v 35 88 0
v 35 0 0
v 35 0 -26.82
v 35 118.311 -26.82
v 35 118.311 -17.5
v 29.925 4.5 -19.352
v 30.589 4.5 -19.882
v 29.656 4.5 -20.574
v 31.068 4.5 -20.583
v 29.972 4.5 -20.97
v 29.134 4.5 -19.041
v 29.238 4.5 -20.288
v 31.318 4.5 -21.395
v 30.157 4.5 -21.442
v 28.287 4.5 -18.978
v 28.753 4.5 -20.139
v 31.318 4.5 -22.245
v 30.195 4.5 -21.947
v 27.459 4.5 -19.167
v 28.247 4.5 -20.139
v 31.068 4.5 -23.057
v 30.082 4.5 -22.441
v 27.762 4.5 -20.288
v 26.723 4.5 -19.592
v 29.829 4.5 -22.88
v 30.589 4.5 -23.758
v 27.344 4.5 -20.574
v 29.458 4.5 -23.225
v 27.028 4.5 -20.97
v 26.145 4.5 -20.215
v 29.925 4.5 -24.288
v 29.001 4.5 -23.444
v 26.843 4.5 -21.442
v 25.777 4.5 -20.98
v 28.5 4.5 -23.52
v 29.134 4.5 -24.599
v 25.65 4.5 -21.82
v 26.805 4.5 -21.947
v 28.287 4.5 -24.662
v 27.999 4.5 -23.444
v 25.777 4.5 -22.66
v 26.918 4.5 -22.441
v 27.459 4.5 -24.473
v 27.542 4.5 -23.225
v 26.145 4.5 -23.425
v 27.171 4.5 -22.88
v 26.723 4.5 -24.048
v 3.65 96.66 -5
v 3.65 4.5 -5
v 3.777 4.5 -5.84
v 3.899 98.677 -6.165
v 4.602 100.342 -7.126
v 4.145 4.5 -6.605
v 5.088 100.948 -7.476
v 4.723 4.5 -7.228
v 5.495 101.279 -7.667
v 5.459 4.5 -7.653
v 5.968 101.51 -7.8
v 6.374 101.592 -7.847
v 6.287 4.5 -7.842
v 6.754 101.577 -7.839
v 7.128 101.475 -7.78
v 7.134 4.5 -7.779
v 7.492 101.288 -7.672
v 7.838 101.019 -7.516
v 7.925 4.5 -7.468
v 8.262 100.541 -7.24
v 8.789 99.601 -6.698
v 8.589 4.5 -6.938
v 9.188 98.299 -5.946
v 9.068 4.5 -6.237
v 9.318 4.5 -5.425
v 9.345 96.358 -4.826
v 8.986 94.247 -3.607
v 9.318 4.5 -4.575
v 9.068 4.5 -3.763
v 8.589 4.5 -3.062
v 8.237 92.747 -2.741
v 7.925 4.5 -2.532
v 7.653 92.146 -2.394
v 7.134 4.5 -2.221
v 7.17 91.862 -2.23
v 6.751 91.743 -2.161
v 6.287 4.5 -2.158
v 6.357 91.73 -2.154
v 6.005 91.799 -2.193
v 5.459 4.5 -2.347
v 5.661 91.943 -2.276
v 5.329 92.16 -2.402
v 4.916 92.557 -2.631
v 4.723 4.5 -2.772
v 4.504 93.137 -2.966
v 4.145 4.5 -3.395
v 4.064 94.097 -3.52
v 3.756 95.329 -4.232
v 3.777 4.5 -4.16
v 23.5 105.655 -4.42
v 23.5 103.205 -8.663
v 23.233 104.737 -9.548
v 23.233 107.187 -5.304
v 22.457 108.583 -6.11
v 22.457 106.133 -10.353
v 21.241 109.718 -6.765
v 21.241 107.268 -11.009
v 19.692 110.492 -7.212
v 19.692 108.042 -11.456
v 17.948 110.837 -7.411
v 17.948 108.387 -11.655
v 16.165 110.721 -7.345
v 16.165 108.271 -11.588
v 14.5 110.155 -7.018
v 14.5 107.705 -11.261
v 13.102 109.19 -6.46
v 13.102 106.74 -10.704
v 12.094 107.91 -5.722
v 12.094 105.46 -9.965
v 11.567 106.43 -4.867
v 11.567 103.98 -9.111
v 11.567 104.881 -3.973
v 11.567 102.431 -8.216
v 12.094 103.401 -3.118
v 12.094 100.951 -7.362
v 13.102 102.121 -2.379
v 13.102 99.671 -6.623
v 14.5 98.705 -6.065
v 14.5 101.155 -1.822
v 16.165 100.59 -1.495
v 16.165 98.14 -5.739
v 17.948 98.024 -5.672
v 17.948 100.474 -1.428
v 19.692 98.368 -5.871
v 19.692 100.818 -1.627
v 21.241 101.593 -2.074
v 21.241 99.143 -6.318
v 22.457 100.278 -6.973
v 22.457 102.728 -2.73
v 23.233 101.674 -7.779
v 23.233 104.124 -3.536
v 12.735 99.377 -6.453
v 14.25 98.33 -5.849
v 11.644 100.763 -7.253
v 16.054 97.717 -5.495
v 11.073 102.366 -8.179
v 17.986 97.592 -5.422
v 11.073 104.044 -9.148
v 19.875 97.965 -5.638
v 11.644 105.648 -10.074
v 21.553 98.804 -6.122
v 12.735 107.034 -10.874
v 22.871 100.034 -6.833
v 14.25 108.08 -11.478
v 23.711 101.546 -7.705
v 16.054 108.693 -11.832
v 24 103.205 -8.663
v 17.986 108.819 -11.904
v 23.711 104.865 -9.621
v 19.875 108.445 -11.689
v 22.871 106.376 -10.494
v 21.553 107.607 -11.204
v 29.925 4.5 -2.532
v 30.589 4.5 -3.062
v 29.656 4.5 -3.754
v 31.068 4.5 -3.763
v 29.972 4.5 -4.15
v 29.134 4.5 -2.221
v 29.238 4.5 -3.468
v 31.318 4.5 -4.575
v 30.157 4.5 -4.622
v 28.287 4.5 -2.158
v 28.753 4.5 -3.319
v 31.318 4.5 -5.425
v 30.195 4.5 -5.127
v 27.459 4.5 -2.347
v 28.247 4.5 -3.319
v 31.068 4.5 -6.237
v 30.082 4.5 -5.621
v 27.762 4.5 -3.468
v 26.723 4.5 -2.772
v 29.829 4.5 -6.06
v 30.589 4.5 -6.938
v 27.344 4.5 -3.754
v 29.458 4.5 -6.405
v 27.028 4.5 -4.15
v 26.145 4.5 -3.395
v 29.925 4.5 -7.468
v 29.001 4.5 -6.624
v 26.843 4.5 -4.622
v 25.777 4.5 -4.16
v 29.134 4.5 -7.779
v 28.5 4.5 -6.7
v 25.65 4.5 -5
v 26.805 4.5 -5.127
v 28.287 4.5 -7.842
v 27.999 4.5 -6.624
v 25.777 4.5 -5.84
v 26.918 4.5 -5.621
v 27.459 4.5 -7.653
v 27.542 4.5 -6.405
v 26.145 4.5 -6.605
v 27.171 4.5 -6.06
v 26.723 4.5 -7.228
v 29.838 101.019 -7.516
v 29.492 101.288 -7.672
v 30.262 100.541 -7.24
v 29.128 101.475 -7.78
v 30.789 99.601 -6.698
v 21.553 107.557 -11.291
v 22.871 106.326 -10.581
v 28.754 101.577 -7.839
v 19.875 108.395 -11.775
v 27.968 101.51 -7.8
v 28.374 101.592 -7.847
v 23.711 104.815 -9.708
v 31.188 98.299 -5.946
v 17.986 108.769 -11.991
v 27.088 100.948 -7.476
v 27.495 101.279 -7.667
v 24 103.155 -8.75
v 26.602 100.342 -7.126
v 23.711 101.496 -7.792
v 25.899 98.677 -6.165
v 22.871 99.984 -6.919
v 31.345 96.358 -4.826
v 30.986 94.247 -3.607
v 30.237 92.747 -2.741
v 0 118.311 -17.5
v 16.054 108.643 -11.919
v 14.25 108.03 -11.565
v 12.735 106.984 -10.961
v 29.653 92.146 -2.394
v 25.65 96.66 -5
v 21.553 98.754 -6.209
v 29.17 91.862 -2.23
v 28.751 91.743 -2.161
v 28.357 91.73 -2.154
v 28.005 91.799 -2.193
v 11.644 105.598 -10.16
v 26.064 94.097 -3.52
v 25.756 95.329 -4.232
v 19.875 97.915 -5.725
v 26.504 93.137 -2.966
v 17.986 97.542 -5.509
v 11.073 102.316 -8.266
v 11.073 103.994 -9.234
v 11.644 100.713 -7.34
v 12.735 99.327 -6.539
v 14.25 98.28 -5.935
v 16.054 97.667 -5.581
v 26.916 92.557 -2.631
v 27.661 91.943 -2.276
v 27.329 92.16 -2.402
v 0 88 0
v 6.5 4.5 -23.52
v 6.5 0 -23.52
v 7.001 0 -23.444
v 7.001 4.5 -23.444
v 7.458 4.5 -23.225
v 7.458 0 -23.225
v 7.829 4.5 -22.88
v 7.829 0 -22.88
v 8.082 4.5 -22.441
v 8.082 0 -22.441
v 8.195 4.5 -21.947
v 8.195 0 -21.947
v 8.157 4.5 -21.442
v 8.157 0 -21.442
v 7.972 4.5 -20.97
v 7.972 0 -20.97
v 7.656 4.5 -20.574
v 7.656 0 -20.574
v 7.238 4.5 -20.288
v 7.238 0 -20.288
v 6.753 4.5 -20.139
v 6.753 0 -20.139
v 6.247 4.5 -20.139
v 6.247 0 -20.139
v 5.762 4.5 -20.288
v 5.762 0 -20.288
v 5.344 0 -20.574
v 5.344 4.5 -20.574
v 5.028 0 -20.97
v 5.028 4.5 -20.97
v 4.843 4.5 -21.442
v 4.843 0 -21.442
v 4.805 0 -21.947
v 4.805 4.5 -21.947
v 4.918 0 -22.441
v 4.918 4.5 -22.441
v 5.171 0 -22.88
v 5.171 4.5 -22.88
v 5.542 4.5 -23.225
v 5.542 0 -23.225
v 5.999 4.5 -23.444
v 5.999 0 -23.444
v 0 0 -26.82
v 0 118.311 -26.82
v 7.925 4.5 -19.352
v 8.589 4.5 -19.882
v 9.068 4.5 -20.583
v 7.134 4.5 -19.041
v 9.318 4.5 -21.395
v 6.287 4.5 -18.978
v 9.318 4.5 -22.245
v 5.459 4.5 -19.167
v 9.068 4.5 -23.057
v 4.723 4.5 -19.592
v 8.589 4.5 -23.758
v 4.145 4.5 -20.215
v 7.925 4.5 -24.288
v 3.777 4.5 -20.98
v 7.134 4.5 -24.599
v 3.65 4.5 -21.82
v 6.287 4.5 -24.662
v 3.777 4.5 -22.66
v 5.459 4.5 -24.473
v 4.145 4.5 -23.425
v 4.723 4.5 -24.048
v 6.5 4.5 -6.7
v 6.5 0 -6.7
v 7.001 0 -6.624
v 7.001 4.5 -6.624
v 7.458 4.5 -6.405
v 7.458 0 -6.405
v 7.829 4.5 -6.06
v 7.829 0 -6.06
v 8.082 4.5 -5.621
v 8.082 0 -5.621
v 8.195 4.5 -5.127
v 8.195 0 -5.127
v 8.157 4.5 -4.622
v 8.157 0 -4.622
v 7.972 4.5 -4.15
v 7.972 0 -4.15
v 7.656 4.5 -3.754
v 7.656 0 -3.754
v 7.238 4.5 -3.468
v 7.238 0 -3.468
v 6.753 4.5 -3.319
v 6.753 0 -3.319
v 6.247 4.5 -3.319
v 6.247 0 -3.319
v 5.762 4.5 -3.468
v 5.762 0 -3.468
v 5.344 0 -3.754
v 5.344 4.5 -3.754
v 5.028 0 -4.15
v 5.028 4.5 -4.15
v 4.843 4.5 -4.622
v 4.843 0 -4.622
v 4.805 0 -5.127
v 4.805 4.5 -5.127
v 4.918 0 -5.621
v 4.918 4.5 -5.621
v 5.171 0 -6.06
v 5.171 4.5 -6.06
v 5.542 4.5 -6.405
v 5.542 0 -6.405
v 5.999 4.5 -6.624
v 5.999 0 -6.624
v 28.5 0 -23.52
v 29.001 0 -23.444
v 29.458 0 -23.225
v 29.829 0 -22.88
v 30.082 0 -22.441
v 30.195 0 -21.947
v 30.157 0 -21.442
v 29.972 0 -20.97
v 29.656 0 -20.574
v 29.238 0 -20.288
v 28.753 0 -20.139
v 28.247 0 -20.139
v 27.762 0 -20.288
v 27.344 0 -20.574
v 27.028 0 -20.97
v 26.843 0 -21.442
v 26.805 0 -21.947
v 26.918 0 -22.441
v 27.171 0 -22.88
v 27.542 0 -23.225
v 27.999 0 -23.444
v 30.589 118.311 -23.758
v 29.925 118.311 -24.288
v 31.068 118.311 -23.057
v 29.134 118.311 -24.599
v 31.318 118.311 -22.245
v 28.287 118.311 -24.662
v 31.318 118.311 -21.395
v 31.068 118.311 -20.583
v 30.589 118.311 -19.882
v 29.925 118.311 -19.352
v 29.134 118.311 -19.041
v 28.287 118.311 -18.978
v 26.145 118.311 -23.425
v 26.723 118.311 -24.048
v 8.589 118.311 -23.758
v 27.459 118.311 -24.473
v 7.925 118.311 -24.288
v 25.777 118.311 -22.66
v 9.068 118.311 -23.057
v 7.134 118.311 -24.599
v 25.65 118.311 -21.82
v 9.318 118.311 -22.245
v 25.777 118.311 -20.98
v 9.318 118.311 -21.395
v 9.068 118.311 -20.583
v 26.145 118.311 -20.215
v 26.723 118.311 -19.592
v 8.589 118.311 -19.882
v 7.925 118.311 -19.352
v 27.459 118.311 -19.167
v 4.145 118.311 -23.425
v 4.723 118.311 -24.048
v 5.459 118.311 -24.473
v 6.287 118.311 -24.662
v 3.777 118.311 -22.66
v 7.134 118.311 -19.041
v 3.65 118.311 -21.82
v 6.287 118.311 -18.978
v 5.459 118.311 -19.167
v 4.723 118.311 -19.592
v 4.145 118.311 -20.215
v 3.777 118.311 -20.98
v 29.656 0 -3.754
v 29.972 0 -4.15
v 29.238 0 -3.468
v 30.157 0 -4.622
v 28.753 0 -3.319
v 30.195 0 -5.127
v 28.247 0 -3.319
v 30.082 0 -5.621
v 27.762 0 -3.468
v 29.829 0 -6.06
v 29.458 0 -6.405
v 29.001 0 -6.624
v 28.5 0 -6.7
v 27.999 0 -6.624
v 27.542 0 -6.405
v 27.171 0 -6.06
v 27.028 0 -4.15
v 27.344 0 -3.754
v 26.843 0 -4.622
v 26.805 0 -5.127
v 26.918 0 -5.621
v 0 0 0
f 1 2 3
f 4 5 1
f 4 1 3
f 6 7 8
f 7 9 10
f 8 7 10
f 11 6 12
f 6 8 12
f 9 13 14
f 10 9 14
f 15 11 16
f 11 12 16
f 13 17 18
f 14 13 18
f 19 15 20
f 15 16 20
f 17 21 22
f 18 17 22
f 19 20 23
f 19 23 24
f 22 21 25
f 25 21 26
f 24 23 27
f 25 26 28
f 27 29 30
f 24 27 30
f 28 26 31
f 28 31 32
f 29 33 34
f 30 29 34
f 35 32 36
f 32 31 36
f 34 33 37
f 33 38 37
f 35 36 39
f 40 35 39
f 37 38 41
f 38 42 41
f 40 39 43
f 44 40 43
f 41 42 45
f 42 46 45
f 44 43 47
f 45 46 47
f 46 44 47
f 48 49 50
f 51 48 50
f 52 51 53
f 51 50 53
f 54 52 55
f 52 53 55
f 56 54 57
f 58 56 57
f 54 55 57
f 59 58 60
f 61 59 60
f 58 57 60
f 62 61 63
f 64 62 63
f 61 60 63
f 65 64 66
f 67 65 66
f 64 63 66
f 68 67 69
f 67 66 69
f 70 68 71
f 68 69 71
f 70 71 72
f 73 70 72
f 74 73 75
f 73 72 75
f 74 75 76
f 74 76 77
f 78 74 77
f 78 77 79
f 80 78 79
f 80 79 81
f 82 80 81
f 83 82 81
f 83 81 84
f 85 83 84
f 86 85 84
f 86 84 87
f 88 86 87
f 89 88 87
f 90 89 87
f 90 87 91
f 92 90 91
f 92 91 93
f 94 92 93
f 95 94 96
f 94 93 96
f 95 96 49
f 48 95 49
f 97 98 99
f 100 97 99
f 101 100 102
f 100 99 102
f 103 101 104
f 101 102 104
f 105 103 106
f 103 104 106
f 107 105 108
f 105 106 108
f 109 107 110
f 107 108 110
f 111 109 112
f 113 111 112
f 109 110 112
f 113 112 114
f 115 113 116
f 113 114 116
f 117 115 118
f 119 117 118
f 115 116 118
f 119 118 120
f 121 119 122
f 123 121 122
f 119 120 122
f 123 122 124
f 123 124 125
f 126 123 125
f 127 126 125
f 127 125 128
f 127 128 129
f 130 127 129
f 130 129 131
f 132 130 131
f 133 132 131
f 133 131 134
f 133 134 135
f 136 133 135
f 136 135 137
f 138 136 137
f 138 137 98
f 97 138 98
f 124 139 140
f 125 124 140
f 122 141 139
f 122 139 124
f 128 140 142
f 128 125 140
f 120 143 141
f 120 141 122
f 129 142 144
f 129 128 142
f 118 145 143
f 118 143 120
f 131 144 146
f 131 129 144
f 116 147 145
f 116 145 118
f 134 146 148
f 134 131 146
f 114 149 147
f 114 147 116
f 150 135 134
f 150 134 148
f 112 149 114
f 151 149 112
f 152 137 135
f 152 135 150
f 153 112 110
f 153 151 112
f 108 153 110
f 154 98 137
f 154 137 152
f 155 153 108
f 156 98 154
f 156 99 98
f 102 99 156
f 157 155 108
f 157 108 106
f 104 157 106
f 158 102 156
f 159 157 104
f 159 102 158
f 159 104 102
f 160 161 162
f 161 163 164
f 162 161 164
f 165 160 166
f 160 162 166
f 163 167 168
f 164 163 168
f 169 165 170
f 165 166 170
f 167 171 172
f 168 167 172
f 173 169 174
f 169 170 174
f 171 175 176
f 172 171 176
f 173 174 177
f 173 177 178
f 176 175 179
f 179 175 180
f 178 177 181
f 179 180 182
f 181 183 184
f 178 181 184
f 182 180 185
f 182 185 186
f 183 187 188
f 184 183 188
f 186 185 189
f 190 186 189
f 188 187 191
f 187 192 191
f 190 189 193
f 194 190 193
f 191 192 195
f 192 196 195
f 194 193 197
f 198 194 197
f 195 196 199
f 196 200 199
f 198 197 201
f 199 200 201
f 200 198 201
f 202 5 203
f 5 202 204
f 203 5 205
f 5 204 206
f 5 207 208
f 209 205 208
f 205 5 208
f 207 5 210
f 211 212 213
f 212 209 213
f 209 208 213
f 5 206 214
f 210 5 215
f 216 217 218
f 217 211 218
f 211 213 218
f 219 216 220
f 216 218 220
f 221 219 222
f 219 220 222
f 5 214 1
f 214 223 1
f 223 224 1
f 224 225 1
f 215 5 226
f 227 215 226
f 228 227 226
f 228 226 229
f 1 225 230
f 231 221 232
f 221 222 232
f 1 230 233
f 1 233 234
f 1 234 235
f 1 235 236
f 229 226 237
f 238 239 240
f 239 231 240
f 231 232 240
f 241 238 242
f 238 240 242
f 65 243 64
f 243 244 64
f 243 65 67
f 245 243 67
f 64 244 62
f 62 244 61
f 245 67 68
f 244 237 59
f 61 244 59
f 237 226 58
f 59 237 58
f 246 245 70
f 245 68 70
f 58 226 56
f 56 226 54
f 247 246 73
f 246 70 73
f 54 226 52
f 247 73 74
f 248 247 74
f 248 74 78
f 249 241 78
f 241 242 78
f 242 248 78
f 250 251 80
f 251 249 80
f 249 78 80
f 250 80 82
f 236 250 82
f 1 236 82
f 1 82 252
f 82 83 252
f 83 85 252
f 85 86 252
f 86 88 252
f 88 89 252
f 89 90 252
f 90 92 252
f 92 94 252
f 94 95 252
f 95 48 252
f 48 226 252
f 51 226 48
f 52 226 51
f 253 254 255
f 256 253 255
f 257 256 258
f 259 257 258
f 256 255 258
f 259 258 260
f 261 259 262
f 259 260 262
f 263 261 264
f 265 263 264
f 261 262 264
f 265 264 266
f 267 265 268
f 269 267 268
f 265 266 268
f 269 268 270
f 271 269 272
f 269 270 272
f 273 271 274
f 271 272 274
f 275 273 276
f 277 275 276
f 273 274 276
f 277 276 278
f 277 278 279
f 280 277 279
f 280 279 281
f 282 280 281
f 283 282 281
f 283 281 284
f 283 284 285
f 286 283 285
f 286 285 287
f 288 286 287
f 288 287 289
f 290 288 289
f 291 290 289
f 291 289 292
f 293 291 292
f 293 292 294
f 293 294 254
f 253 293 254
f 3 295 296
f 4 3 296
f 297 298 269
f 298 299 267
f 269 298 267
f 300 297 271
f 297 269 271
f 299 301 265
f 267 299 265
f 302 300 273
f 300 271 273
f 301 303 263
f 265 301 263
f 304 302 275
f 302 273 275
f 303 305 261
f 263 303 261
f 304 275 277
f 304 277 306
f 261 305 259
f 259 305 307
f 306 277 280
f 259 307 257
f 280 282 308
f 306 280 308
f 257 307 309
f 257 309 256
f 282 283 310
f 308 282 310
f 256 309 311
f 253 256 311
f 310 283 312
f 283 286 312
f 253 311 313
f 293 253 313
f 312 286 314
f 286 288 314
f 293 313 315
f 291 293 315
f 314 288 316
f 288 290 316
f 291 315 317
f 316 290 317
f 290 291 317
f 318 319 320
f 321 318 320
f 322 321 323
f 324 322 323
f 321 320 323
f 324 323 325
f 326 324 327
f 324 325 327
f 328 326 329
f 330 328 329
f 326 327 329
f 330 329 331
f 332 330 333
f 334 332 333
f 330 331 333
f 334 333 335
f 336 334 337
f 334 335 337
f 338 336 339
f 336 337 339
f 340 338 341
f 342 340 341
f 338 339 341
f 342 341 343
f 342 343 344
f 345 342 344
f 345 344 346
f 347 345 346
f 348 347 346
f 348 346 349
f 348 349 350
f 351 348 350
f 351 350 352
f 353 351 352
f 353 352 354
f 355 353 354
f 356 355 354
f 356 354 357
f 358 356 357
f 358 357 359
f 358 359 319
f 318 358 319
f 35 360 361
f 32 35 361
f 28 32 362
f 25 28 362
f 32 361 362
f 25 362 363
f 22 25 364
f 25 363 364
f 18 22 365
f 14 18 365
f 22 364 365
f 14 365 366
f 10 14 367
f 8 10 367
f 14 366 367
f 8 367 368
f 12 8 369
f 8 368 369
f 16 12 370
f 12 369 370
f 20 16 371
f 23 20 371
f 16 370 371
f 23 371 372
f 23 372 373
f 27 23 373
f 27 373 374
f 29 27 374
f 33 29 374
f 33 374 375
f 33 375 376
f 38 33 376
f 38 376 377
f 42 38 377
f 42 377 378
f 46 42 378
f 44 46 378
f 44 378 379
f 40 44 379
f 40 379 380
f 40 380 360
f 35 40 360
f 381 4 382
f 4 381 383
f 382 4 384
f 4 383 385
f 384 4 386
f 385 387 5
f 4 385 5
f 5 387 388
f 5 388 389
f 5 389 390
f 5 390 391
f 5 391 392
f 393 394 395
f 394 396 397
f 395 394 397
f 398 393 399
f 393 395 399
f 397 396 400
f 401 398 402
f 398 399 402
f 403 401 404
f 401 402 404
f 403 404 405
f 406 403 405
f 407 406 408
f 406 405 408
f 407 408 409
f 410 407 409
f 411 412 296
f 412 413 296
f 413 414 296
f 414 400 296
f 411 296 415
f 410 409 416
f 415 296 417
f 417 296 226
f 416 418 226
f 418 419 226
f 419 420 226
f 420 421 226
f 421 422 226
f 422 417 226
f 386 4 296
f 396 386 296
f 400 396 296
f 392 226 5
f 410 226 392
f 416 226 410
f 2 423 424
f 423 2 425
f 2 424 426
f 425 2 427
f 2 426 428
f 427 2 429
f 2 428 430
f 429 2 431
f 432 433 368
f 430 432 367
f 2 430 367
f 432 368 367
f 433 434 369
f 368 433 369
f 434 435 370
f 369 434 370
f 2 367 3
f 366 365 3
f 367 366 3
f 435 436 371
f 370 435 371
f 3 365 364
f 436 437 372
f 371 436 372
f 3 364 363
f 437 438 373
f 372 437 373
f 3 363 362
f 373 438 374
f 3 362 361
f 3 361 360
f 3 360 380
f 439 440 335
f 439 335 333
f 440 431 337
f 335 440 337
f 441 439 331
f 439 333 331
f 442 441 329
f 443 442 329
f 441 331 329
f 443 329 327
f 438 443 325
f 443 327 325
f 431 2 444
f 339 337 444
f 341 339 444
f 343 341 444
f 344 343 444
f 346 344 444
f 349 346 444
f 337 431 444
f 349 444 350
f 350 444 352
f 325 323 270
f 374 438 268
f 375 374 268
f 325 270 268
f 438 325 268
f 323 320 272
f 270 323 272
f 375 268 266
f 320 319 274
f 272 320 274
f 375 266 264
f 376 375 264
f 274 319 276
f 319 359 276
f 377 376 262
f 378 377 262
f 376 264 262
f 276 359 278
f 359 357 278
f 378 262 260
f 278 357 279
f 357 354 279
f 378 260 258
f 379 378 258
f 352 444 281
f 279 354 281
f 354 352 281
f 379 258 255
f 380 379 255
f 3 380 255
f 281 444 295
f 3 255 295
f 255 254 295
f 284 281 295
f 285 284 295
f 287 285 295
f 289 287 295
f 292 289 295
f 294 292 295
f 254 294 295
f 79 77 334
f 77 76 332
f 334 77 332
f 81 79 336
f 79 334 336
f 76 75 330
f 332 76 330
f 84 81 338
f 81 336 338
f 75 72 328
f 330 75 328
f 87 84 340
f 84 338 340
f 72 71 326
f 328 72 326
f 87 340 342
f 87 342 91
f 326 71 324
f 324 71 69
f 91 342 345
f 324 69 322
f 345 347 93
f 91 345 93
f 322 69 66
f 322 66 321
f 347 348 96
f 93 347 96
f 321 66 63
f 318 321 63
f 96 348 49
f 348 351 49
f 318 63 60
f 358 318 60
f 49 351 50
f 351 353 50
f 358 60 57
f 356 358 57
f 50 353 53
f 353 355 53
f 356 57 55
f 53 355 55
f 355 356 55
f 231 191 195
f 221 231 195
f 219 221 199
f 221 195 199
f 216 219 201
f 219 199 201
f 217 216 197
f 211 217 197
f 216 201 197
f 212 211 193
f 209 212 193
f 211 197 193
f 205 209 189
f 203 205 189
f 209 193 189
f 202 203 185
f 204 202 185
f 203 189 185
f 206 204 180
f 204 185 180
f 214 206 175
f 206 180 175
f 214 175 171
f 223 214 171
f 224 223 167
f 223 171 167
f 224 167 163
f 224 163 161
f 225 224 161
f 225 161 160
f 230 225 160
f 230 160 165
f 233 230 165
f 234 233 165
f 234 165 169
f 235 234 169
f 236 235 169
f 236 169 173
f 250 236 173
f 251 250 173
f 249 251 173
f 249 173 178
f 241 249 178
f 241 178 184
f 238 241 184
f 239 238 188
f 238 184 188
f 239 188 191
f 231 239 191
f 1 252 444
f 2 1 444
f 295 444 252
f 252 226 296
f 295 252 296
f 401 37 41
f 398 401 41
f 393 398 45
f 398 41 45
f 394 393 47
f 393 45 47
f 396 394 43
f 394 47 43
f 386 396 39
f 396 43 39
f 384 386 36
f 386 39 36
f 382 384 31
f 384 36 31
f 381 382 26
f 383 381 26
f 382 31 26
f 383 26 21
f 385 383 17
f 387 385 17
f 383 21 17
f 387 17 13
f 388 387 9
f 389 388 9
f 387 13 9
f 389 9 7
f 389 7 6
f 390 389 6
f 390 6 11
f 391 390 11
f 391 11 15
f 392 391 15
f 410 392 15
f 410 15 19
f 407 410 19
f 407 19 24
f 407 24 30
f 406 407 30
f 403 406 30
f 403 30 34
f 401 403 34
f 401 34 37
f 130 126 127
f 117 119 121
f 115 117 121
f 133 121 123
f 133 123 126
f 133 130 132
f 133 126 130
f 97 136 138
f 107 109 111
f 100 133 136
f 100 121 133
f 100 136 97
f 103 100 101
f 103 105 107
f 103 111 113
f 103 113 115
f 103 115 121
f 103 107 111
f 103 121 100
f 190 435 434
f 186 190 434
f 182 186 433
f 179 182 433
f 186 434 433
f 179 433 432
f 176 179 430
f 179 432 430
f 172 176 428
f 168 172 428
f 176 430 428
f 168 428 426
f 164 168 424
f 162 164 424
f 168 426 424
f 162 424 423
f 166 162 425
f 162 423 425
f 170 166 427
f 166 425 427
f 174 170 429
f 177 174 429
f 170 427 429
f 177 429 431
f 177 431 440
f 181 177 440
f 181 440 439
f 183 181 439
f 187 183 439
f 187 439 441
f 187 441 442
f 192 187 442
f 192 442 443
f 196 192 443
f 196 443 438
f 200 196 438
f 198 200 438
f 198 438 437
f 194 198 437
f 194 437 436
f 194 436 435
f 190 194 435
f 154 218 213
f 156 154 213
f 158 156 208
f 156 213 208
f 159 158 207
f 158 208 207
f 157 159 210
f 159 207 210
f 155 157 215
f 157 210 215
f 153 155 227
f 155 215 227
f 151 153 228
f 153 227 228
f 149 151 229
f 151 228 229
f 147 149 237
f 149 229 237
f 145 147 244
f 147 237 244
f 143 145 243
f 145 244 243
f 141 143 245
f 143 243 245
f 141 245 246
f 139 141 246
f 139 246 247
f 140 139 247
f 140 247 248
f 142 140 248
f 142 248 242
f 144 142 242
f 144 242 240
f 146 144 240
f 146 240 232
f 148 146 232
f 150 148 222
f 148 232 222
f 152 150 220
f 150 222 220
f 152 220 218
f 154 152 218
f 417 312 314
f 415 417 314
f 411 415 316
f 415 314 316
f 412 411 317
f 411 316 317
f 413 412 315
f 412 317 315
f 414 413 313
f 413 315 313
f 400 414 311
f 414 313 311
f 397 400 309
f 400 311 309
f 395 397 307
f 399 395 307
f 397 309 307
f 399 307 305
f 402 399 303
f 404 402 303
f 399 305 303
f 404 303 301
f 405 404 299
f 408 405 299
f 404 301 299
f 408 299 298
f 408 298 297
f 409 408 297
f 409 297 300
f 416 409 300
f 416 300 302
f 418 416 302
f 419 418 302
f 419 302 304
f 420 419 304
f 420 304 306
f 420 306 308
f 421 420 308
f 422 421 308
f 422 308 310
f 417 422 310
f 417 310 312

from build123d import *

# Parameters (mm, degrees)
AUFSATZ_LINEAR_AUSTRAGEN1_DEPTH      = 35
SKIZZE3_R                            = 6
AUFSATZ_LINEAR_AUSTRAGEN2_DEPTH      = 5
SKIZZE4_R                            = 6.5
AUFSATZ_LINEAR_AUSTRAGEN3_DEPTH      = 0.1
SKIZZE7_R                            = 2.85
SCHNITT_LINEAR_AUSTRAGEN1_DEPTH      = 114.810889132
F_3_4_3_4_DURCHMESSER_BOHRUNG1_D     = 3.4
F_3_4_3_4_DURCHMESSER_BOHRUNG1_DEPTH = 4.5


with BuildPart() as part:
    # Skizze1 → Aufsatz-Linear austragen1 (new body)
    with BuildSketch(Plane(origin=(0, 0, 0), x_dir=(0, 0, -1), z_dir=(1, 0, 0))):
        Polygon((0, 0), (17.5, 0), (26.82, 0), (26.82, 118.310889132), (17.5, 118.310889132), (0, 88), align=None)
    extrude(amount=AUFSATZ_LINEAR_AUSTRAGEN1_DEPTH)

    # Skizze3 → Aufsatz-Linear austragen2 (add)
    with BuildSketch(Plane(origin=(0, 22, 38.105117767), x_dir=(1, 0, 0), z_dir=(0, 0.5, 0.866025404))):
        with Locations((17.5, 93.710235533)):
            Circle(SKIZZE3_R)
    extrude(amount=AUFSATZ_LINEAR_AUSTRAGEN2_DEPTH)

    # Skizze4 → Aufsatz-Linear austragen3 (add)
    with BuildSketch(Plane(origin=(0, 22, 38.105117767), x_dir=(1, 0, 0), z_dir=(0, 0.5, 0.866025404))):
        with Locations((17.5, 93.710235533)):
            Circle(SKIZZE4_R)
    extrude(amount=AUFSATZ_LINEAR_AUSTRAGEN3_DEPTH)

    # Skizze7 → Schnitt-Linear austragen1 (cut, through all)
    with BuildSketch(Plane(origin=(0, 4.5, 0), x_dir=(-1, 0, 0), z_dir=(0, -1, 0))):
        with Locations((-28.5, 5)):
            Circle(SKIZZE7_R)
        with Locations((-6.5, 5)):
            Circle(SKIZZE7_R)
        with Locations((-6.5, 21.82)):
            Circle(SKIZZE7_R)
        with Locations((-28.5, 21.82)):
            Circle(SKIZZE7_R)
    extrude(amount=-SCHNITT_LINEAR_AUSTRAGEN1_DEPTH, mode=Mode.SUBTRACT)

    # Ø3.4 (3.4) Durchmesser Bohrung1
    with Locations(Plane(origin=(6.5, 4.5, -5), x_dir=(0, 0, 1), z_dir=(0, 1, 0))):
        with Locations((0, 0), (-16.82, 0), (-16.82, 22), (0, 22)):
            Hole(F_3_4_3_4_DURCHMESSER_BOHRUNG1_D / 2, depth=F_3_4_3_4_DURCHMESSER_BOHRUNG1_DEPTH)


solid = part.part
